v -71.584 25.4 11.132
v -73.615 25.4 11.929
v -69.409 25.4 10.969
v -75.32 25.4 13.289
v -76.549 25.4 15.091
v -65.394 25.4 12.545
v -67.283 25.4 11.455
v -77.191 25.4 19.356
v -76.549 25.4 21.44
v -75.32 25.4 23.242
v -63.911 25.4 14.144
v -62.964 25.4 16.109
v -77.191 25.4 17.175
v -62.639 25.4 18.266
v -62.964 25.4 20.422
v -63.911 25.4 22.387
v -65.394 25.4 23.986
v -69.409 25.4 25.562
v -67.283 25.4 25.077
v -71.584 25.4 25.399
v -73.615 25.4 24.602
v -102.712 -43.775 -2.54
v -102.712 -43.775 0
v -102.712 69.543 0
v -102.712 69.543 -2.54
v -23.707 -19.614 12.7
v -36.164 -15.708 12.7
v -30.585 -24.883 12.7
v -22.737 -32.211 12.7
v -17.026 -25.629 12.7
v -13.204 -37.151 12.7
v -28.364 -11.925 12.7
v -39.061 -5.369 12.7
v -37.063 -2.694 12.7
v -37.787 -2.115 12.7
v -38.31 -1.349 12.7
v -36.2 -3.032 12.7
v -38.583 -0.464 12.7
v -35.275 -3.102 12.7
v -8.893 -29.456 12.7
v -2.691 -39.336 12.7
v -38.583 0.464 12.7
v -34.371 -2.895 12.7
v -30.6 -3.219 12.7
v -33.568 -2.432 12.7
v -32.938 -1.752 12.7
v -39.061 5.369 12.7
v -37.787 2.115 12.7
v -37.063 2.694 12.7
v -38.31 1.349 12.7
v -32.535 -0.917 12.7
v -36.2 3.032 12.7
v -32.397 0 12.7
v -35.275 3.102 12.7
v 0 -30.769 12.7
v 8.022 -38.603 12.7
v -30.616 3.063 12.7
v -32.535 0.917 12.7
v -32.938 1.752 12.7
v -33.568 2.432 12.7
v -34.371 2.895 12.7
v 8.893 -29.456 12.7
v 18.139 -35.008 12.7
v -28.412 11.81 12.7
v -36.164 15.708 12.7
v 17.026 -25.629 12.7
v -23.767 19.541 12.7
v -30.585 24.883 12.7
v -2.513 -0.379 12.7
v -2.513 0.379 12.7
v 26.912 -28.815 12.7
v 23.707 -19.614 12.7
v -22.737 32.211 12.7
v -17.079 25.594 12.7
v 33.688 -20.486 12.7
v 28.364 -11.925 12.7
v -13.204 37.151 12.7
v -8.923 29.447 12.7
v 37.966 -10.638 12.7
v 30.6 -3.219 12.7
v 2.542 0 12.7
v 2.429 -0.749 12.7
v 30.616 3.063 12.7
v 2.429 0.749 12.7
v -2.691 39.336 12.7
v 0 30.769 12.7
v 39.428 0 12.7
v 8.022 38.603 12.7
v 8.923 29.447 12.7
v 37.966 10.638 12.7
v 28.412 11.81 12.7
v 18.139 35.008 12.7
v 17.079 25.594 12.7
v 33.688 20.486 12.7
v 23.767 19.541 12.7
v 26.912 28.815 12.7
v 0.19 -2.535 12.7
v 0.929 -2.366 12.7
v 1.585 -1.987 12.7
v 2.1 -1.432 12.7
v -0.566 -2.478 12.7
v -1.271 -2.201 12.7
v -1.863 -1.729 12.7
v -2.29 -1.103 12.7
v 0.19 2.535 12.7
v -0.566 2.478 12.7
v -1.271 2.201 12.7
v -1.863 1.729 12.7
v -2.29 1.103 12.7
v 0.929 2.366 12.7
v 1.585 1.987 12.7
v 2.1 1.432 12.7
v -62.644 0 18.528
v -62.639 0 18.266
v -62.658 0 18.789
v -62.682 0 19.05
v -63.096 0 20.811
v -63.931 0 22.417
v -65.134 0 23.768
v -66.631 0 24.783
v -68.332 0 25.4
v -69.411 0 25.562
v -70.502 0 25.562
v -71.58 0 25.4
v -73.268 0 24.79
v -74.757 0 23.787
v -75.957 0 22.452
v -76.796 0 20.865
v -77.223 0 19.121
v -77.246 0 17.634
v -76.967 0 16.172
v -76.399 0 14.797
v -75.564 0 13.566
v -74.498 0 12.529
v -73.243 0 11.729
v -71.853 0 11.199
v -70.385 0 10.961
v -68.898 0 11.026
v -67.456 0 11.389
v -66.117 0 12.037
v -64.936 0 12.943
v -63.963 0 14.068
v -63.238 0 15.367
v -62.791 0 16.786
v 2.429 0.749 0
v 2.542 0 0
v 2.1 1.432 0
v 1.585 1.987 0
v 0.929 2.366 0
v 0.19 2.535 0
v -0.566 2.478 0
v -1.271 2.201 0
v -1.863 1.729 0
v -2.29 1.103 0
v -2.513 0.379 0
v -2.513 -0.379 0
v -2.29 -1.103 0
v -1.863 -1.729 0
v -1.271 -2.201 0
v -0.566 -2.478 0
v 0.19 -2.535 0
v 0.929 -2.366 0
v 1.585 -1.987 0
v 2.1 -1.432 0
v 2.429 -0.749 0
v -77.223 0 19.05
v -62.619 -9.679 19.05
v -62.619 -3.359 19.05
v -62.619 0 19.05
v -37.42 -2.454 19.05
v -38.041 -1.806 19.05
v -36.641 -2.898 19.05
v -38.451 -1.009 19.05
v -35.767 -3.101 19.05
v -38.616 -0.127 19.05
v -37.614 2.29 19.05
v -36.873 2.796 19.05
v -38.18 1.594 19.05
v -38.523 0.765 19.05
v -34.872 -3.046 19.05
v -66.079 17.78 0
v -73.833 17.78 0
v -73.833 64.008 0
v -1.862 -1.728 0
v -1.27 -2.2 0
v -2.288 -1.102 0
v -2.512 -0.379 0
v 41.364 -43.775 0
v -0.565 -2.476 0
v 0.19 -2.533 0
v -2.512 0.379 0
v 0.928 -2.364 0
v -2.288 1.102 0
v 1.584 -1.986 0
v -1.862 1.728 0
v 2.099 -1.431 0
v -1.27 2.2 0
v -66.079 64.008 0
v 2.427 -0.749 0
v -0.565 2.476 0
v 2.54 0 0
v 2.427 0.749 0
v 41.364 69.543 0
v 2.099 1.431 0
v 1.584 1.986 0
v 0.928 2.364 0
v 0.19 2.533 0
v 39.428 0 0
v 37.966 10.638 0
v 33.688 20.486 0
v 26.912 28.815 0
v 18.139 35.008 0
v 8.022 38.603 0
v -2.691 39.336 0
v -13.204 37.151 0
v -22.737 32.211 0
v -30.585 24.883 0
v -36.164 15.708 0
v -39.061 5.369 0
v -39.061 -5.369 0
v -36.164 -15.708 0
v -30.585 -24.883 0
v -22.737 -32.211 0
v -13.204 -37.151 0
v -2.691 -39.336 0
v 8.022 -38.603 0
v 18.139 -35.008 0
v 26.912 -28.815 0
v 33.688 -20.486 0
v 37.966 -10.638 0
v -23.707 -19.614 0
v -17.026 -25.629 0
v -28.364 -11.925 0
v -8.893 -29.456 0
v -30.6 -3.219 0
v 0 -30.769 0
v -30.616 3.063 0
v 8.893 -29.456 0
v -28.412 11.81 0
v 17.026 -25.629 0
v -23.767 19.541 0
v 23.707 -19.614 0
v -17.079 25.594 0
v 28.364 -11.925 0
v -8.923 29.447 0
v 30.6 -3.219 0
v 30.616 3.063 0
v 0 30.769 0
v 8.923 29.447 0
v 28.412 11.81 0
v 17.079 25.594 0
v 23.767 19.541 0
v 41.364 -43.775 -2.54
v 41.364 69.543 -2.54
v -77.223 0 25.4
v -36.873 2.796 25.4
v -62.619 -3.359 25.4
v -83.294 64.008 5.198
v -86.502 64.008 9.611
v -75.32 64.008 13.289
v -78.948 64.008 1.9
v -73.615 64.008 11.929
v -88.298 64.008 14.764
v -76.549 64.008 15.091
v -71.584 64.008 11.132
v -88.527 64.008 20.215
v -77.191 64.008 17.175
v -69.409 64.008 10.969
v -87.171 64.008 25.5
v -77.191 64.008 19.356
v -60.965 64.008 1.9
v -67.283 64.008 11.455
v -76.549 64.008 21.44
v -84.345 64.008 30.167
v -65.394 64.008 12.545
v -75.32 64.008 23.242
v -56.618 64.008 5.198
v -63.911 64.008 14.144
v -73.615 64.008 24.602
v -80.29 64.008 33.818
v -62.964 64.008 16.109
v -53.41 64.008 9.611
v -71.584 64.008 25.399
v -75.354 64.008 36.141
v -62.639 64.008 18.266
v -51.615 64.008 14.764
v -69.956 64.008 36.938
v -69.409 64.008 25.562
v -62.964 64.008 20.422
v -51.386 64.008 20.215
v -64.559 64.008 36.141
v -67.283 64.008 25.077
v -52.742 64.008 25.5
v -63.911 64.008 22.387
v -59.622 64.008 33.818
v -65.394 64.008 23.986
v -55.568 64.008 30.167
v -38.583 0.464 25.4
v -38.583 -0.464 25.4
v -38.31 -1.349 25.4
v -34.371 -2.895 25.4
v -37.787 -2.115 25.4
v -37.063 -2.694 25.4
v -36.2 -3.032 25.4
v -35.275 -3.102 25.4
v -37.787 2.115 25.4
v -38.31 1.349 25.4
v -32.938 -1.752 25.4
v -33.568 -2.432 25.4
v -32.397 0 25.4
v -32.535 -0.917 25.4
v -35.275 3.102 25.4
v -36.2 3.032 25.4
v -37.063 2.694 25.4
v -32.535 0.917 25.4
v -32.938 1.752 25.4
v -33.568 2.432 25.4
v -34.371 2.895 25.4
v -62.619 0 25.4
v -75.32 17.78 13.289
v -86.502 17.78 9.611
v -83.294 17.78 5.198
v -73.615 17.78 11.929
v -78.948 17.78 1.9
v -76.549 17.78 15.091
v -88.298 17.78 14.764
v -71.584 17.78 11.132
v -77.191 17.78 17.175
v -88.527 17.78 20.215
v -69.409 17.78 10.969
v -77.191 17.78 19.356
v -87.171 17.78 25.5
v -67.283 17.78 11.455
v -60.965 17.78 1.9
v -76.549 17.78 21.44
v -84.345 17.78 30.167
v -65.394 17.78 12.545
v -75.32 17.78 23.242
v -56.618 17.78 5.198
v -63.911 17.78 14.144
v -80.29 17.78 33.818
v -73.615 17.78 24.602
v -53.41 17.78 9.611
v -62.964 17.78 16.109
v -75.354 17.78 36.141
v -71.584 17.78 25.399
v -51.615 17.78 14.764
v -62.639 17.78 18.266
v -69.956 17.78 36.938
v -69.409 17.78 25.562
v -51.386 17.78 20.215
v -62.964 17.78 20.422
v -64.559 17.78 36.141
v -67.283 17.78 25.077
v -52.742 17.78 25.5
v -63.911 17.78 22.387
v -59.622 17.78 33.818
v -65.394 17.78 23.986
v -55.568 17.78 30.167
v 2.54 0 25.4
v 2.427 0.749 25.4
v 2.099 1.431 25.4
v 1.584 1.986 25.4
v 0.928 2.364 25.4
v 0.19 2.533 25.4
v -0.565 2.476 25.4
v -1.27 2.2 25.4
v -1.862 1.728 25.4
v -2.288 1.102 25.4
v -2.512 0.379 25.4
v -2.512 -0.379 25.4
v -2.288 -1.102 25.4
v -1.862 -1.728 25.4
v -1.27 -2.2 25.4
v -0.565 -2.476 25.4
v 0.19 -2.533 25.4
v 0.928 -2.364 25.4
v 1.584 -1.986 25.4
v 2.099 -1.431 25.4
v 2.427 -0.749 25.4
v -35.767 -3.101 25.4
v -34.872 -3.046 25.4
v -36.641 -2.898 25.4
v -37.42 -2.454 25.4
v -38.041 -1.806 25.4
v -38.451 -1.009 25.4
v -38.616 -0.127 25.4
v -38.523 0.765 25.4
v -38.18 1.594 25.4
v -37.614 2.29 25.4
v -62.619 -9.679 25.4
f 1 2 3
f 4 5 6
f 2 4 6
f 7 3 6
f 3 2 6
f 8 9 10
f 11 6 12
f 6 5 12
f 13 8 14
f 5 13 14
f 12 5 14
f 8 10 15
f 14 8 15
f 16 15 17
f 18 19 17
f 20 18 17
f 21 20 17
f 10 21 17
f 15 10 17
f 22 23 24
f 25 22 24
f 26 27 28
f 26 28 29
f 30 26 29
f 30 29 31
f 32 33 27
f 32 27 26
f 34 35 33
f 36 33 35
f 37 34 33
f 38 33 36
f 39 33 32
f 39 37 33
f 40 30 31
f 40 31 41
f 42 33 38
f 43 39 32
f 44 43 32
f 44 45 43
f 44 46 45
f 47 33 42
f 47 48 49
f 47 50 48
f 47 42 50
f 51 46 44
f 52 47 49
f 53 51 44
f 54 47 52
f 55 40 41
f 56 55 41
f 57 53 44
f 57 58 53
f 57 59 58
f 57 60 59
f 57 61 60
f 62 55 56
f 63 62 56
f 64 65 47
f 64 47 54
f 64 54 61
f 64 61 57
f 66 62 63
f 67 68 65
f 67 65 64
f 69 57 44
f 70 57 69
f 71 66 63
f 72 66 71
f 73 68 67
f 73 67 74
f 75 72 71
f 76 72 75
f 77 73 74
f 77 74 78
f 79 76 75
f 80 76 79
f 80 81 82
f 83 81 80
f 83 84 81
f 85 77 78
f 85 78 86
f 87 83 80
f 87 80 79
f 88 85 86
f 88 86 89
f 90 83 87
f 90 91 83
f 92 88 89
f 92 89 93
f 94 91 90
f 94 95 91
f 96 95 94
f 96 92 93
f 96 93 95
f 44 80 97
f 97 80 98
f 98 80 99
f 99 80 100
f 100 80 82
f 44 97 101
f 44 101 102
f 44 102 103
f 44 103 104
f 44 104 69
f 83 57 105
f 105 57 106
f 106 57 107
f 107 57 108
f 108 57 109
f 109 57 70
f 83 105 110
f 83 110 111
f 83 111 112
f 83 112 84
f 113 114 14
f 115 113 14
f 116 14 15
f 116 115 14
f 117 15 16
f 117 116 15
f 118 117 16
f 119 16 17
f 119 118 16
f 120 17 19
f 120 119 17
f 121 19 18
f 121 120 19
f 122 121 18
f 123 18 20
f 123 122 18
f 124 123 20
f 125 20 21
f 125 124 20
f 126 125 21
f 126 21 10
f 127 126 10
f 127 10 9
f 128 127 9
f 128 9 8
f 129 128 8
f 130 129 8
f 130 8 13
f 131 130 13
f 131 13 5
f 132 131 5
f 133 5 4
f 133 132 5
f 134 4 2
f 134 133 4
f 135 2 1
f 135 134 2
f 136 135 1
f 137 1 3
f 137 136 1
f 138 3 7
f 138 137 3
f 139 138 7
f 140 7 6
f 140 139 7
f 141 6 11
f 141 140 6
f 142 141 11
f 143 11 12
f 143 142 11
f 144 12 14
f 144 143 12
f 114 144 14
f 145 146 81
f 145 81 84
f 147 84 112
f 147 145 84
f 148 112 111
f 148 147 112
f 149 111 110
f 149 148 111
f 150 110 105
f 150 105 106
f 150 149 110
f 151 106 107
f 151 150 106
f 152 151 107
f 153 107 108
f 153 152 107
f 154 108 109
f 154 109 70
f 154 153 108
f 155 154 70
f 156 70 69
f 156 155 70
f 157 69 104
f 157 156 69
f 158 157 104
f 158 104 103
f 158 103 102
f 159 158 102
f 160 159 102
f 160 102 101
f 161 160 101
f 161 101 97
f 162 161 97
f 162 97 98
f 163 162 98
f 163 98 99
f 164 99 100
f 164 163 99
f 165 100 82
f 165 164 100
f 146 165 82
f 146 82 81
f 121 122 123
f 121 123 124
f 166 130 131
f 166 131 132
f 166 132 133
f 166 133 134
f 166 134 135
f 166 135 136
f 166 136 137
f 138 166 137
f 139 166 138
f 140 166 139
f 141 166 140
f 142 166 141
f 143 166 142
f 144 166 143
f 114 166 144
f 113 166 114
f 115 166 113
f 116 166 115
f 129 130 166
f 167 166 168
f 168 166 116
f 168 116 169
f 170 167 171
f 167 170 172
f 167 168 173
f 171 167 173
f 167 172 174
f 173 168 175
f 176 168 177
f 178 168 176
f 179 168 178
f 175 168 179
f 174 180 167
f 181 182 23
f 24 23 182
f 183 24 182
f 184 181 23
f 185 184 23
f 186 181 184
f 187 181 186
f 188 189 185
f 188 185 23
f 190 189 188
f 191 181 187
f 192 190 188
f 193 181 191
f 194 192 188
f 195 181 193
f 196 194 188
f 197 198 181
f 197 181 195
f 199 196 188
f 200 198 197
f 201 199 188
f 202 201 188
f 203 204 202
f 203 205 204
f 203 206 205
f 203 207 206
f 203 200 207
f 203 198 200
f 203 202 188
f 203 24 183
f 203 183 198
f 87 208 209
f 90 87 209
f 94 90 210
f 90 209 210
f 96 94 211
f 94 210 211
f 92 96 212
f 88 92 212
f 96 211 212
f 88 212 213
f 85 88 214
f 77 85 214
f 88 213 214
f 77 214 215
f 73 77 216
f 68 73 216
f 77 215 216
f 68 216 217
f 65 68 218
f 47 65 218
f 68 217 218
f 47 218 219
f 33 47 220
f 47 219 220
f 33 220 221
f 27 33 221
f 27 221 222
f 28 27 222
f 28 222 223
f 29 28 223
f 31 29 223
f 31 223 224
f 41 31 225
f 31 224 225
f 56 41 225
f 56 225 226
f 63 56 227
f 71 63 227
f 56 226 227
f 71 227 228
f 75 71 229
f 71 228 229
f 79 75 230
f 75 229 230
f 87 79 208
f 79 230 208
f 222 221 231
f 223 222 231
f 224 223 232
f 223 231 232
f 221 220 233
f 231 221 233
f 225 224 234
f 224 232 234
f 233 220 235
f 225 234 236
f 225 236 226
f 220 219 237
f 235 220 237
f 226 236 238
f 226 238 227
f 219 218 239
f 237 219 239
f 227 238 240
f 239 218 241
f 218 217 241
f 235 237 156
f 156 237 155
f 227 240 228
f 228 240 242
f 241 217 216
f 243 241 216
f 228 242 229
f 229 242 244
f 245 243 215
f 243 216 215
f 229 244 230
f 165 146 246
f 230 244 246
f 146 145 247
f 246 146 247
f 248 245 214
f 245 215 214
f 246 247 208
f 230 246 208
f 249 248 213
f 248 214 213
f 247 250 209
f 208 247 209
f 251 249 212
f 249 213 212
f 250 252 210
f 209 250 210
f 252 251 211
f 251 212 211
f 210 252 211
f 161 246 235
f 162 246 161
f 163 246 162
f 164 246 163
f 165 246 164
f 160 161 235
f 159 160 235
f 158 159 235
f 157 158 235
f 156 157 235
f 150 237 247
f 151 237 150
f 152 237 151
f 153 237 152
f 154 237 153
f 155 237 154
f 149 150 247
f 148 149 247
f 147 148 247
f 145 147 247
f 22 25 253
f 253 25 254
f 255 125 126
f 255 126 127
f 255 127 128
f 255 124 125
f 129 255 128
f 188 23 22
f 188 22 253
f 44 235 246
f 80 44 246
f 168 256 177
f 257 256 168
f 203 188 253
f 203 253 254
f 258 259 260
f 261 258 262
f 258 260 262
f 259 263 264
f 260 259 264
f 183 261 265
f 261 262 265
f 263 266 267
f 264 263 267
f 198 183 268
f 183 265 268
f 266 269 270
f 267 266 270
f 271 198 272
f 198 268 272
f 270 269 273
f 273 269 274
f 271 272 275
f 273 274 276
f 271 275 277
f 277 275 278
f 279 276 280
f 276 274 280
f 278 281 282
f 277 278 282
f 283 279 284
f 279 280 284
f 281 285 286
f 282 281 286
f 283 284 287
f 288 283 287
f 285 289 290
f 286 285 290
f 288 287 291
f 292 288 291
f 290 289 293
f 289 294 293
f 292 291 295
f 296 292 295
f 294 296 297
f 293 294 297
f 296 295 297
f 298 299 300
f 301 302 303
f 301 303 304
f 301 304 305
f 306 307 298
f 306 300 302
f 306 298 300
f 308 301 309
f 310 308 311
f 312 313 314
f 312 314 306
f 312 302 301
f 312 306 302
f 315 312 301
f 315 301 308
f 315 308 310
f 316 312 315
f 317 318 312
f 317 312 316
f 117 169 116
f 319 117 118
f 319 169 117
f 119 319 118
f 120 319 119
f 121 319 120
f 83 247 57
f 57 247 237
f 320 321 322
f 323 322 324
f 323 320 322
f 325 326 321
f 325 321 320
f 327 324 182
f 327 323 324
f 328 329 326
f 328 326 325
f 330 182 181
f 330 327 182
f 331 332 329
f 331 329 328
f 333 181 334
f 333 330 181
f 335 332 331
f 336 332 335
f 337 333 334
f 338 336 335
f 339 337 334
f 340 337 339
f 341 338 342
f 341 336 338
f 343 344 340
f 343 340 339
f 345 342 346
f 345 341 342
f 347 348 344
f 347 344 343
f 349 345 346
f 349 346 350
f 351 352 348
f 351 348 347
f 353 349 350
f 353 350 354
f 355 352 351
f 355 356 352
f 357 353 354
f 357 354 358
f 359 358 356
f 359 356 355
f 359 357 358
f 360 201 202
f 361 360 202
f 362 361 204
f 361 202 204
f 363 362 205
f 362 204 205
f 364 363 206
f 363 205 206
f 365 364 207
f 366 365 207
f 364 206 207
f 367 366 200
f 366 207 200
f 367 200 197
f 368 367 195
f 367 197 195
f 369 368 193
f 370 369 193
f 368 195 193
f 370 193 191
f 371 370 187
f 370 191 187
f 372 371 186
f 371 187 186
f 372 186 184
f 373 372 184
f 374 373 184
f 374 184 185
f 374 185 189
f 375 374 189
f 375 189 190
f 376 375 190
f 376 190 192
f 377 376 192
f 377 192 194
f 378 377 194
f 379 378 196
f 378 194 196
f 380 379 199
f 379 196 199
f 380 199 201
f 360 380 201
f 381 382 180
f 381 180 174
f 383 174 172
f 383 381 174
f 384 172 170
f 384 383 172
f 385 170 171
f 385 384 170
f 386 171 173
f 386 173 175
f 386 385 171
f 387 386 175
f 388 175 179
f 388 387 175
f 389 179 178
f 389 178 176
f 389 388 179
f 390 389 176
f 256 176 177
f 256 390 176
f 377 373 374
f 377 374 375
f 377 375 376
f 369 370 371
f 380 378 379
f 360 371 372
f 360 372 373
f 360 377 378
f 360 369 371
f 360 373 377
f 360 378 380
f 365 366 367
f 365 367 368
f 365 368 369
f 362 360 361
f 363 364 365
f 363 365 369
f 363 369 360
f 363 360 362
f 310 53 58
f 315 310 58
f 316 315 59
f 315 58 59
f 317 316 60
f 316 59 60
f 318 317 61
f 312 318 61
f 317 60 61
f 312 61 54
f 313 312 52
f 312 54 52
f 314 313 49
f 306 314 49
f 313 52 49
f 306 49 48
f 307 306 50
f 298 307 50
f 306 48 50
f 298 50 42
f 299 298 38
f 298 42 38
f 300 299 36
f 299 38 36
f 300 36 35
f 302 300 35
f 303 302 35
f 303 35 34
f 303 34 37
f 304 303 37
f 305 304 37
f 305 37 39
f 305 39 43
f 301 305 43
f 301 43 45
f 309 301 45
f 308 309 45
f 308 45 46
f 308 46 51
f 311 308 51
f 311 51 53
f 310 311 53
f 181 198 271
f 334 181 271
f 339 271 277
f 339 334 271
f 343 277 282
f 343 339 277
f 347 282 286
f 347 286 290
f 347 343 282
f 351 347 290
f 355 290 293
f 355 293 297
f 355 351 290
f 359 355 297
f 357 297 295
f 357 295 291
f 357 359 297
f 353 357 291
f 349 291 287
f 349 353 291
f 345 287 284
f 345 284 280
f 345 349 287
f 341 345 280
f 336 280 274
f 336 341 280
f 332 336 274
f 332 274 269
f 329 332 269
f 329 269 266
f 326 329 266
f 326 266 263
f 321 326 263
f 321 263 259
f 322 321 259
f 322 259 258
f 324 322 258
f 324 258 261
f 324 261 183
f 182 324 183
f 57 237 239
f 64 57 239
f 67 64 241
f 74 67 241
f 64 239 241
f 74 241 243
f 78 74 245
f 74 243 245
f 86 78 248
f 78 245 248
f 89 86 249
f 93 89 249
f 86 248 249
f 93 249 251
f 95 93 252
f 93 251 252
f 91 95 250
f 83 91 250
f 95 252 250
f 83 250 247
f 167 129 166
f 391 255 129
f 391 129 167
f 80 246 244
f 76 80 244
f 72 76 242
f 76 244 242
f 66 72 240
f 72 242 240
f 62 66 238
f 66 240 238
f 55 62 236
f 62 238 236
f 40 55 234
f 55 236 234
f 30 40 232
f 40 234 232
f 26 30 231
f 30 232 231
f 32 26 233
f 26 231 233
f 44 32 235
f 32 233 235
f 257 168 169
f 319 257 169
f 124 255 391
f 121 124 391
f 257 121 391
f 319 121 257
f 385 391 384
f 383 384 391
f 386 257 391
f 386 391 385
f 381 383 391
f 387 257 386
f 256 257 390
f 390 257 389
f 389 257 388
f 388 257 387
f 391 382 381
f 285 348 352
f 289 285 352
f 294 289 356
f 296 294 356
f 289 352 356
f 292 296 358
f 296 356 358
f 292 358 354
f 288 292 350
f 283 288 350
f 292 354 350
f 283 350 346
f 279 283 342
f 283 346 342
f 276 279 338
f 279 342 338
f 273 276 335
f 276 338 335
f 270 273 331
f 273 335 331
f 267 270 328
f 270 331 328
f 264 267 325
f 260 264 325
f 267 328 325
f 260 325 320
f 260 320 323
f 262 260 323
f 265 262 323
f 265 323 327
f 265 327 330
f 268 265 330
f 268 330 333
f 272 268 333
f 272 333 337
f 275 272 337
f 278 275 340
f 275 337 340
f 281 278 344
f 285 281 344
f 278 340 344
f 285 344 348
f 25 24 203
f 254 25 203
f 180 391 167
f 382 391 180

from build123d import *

# Parameters (mm, degrees)
F0_R      = 39.4279927029
F0_R_2    = 3.110199546
F0_R_3    = 2.5417923474
F1_DEPTH  = 12.7
F2_DEPTH  = 25.4
F3_W      = 144.0756171942
F3_H      = 113.317899406
F3_R      = 2.54
F4_DEPTH  = 2.54
F5_DEPTH  = 25.4
F7_START  = -17.78
F6_R      = 18.6725970097
F6_R_2    = 7.3168423601
F7_DEPTH  = 46.228
F8_DEPTH  = 25.4
F10_DEPTH = 6.35


with BuildPart() as f1:
    # F0 (on Top) → F1 (new body)
    with BuildSketch(Plane.XY):
        Circle(F0_R)
        with BuildLine():
            Line((-30.5999443991, -3.2187987467), (30.5999443991, -3.2187987467))
            ThreePointArc((30.5999443991, -3.2187987467), (0, -30.7687708984), (-30.5999443991, -3.2187987467))
        make_face(mode=Mode.SUBTRACT)
        with Locations((-35.5075187981, 0)):
            Circle(F0_R_2, mode=Mode.SUBTRACT)
        with BuildLine():
            ThreePointArc((-30.6159461769, 3.0628585164), (0, 30.7687708984), (30.6159461769, 3.0628585164))
            Line((30.6159461769, 3.0628585164), (-30.6159461769, 3.0628585164))
        make_face(mode=Mode.SUBTRACT)
        Circle(F0_R_3, mode=Mode.SUBTRACT)
    extrude(amount=F1_DEPTH)

    # F0 (on Top) → F2 (join)
    with BuildSketch(Plane.XY):
        with Locations((-35.5075187981, 0)):
            Circle(F0_R_2)
    extrude(amount=F2_DEPTH)


with BuildPart() as f4:
    # F3 (on Top) → F4 (new body)
    with BuildSketch(Plane.XY):
        with Locations((-30.6740552187, 12.8842480481)):
            Rectangle(F3_W, F3_H)
        Circle(F3_R, mode=Mode.SUBTRACT)
        Circle(F3_R)
    extrude(amount=-F4_DEPTH)

    # F3 (on Top) → F5 (join)
    with BuildSketch(Plane.XY):
        Circle(F3_R)
    extrude(amount=F5_DEPTH)

    # F6 (on Front) → F7 (join)
    with BuildSketch(Plane.XZ.offset(F7_START)):
        with Locations((-69.9562728405, 18.2656385005)):
            Circle(F6_R)
        with Locations((-69.9562728405, 18.2656385005)):
            Circle(F6_R_2, mode=Mode.SUBTRACT)
    extrude(amount=-F7_DEPTH)


with BuildPart() as f8:
    # F6 (on Front) → F8 (new body)
    with BuildSketch(Plane.XZ):
        with Locations((-69.9562728405, 18.2656385005)):
            Circle(F6_R_2)
    extrude(amount=-F8_DEPTH)

    # F9 (on face) → F10 (join)
    with BuildSketch(Plane.XY.offset(25.4)):
        with BuildLine():
            ThreePointArc((-34.8718399034, -3.0458733711), (-38.4510115189, -1.0086044085), (-36.8734681671, 2.7956420678))
            Line((-36.8734681671, 2.7956420678), (-62.6186206937, -3.3591403626))
            Line((-62.6186206937, -3.3591403626), (-62.6186206937, -9.6791764262))
            Line((-62.6186206937, -9.6791764262), (-34.8718399034, -3.0458733711))
        make_face()
        Polygon((-62.6186206937, -9.6791764262), (-62.6186206937, -3.3591403626), (-62.6186206937, 0), (-77.2229358554, 0), align=None)
    extrude(amount=-F10_DEPTH)


solid = Compound([f1.part, f4.part, f8.part])
